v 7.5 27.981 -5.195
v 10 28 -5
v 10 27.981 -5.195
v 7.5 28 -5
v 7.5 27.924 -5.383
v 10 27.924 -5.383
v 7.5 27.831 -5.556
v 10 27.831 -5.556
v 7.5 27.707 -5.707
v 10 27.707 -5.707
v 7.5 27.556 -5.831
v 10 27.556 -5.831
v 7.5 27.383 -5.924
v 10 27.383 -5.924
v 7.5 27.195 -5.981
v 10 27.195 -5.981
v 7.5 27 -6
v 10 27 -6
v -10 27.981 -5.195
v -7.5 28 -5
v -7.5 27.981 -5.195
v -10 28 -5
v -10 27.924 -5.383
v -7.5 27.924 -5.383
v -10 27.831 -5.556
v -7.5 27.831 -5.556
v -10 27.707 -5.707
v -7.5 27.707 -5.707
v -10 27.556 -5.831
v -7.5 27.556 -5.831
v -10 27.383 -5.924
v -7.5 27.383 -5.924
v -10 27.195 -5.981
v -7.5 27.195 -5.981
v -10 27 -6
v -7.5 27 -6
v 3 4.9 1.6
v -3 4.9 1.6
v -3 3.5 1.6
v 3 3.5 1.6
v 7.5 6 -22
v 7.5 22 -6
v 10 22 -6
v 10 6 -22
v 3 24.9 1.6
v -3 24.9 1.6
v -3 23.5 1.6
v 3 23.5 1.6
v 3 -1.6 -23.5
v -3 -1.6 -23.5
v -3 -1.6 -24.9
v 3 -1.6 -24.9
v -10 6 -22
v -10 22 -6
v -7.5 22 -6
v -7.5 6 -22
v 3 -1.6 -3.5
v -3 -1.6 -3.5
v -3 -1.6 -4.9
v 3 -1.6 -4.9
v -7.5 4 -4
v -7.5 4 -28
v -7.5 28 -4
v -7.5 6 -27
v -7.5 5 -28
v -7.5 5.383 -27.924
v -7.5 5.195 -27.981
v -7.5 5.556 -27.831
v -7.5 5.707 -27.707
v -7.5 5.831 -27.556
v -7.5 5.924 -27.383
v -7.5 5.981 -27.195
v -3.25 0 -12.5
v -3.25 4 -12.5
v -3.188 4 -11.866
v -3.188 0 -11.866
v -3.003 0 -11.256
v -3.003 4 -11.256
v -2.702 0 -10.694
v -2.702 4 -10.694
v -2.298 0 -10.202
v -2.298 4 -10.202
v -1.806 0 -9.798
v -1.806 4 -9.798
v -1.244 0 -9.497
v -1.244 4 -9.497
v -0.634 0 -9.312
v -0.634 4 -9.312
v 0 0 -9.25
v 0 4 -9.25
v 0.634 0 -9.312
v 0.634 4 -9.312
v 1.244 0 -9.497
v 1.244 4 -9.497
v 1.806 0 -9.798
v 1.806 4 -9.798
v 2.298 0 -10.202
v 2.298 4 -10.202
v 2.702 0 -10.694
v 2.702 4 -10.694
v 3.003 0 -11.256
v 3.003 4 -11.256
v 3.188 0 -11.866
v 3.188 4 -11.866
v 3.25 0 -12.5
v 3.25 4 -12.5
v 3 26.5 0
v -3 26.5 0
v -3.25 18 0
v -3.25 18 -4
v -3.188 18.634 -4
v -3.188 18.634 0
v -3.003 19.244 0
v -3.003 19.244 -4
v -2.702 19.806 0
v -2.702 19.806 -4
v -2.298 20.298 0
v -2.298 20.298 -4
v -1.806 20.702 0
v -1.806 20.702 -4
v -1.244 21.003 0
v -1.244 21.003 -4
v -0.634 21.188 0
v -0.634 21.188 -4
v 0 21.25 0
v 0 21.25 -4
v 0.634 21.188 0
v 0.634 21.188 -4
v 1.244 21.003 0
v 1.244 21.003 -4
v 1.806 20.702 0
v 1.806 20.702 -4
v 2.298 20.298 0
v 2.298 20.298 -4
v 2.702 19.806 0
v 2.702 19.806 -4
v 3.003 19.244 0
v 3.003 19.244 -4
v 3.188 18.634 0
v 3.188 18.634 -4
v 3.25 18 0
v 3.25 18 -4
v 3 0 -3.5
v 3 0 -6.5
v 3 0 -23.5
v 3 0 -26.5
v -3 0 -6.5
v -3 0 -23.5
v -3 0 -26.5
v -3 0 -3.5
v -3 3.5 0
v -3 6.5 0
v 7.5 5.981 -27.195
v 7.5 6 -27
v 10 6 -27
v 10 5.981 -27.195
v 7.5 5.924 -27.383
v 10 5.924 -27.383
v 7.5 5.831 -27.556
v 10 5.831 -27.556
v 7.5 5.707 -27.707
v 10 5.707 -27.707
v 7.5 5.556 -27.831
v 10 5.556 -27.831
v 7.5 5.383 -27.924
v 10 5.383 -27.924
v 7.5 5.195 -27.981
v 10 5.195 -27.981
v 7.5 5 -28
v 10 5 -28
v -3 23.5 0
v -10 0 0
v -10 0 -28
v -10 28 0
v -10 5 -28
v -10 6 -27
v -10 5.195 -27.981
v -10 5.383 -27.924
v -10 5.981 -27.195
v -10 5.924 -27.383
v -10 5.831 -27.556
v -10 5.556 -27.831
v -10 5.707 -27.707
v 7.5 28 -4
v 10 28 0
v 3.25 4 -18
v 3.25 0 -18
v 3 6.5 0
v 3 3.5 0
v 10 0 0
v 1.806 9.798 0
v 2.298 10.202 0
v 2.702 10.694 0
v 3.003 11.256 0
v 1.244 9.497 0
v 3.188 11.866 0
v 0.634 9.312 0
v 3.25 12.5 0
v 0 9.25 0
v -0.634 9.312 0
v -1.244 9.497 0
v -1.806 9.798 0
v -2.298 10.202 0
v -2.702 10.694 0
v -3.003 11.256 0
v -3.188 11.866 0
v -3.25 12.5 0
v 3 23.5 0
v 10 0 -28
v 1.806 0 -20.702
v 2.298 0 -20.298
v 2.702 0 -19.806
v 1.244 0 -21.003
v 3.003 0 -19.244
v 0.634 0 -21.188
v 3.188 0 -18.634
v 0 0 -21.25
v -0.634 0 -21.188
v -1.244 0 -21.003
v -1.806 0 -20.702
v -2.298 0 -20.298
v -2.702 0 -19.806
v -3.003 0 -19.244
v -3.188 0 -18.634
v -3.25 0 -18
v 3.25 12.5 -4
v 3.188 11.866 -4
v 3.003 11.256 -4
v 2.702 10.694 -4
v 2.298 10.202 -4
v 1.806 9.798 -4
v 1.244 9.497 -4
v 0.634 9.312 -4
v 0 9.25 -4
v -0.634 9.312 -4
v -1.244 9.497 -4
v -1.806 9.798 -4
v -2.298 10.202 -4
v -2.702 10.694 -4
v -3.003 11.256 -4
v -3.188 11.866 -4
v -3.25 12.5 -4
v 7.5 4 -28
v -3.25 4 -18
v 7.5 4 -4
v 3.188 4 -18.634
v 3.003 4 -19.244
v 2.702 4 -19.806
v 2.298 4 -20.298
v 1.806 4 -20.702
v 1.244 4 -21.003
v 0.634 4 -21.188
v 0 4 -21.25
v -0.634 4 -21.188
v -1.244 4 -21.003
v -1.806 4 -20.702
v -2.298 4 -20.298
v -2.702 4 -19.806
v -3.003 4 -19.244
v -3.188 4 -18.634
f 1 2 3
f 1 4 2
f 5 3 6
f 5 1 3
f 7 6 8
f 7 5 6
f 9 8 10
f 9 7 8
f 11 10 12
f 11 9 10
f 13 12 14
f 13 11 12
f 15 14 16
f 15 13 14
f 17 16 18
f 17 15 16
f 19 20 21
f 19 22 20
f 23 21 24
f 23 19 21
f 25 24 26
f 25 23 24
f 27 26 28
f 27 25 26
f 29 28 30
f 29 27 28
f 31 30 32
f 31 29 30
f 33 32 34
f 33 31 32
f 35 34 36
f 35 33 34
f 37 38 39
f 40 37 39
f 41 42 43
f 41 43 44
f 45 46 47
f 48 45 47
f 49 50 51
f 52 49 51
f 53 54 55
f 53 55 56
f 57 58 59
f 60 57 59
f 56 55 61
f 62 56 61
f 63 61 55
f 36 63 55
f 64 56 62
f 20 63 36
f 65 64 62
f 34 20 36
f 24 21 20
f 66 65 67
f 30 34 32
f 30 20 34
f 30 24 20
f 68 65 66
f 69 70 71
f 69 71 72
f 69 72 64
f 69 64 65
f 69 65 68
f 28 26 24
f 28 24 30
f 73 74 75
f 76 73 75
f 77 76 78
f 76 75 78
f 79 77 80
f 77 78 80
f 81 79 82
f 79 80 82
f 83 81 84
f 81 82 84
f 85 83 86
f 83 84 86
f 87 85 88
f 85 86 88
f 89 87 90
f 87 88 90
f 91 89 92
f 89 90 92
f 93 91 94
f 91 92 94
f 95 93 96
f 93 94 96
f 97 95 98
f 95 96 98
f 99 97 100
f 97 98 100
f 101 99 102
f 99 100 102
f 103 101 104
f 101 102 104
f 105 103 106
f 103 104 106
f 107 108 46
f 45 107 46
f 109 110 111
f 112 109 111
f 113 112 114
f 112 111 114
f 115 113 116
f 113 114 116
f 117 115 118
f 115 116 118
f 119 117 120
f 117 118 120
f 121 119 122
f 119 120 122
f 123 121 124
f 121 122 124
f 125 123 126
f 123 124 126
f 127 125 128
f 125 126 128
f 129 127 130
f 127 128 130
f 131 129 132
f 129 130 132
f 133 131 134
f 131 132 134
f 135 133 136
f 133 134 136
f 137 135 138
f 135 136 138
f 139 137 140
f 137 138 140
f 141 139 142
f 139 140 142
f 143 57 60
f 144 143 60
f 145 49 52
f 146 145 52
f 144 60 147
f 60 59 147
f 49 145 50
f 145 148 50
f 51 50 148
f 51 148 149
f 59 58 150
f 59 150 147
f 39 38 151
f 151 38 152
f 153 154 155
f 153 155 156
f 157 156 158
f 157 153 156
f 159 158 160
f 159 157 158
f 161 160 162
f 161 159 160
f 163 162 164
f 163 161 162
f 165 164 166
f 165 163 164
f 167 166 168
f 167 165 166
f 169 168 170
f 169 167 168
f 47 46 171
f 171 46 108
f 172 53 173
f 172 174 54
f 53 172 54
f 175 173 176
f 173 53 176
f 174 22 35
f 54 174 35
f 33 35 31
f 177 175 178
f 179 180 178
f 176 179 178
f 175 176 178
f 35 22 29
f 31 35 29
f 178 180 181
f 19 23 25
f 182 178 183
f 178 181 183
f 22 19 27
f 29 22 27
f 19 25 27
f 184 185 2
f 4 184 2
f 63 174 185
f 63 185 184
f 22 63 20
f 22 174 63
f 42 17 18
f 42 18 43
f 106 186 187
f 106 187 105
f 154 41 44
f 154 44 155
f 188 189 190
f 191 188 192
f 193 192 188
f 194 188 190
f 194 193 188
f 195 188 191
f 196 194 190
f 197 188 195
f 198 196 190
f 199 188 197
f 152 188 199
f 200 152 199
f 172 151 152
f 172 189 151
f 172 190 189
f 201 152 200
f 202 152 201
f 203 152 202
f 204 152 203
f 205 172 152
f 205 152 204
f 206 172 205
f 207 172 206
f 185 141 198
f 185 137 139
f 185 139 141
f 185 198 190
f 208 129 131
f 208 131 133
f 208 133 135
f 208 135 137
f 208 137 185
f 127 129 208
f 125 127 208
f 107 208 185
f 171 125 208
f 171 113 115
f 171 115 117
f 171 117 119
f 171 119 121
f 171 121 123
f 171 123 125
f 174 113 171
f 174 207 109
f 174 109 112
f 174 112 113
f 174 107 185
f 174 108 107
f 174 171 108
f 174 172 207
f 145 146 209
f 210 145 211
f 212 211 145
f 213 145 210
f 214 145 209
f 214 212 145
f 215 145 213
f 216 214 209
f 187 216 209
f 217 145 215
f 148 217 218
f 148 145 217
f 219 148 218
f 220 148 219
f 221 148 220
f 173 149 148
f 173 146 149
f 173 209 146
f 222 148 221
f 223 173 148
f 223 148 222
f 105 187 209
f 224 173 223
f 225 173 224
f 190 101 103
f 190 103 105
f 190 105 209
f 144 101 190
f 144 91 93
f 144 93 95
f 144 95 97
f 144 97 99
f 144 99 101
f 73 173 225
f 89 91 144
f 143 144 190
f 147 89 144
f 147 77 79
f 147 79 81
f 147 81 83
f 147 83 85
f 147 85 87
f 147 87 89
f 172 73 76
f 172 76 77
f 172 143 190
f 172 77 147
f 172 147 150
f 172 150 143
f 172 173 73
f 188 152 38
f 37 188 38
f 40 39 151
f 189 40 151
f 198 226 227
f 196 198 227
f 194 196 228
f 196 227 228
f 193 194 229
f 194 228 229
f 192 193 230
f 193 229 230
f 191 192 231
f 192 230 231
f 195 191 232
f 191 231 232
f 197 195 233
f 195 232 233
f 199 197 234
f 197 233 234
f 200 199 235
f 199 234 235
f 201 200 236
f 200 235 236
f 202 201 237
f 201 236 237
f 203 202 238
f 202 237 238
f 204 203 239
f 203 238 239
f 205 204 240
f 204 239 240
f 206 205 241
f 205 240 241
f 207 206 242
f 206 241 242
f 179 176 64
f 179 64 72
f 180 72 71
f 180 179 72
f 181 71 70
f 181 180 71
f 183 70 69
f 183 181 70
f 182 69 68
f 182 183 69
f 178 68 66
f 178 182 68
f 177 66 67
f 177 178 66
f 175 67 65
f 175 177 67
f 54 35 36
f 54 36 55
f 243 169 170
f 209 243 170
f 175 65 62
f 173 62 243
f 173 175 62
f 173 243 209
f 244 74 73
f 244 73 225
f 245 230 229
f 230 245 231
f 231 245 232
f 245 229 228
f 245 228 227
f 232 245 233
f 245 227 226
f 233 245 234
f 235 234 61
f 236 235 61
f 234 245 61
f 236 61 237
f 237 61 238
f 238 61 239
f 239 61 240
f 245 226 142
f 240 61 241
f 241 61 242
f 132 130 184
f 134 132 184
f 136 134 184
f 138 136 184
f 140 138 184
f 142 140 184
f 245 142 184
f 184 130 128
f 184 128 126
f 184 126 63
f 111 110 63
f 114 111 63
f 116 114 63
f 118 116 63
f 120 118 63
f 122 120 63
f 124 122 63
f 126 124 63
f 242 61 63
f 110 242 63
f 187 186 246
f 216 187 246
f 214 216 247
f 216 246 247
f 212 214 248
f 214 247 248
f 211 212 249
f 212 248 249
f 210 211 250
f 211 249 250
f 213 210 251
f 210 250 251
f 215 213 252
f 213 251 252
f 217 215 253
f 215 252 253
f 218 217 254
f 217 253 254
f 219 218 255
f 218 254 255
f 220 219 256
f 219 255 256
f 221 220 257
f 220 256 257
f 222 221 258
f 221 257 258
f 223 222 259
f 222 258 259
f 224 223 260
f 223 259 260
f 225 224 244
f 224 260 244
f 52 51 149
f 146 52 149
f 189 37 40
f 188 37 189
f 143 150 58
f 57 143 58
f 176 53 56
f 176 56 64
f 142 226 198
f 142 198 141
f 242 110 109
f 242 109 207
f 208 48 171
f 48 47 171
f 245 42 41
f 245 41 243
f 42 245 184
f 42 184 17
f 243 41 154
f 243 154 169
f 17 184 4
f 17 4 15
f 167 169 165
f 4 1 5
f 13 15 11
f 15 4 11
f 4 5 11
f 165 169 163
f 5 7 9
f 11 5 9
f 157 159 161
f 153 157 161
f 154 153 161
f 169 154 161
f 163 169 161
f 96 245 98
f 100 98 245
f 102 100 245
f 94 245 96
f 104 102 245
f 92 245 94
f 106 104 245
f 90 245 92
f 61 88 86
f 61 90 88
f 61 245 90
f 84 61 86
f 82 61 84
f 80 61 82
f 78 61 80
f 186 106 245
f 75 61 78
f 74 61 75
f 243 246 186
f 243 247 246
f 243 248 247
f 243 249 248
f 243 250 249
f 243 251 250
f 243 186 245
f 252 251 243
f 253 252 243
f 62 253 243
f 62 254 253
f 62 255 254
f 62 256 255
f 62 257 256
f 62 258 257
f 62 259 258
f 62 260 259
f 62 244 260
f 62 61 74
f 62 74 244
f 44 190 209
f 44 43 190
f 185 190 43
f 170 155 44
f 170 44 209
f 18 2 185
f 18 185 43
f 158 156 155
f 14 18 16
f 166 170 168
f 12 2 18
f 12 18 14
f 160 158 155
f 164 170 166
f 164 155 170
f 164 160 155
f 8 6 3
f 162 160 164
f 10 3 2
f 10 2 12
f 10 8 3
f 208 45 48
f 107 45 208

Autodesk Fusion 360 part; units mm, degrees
sketch "Sketch1" plane through (0, 0, 0) normal (1, 0, 0) x (0, 0, -1)
  line L0 (0, 0) -> (0, 28)
  line L1 (0, 28) -> (5, 28)
  line L2 (6, 27) -> (6, 22)
  line L3 (6, 22) -> (22, 6)
  line L4 (22, 6) -> (27, 6)
  line L5 (28, 5) -> (28, 0)
  line L6 (28, 0) -> (0, 0)
  line L7 (4, 4) -> (28, 4)
  line L8 (4, 4) -> (4, 28)
  arc A0 (6, 27) -> (5, 28) centre (5, 27) ccw
  arc A1 (28, 5) -> (27, 6) centre (27, 5) ccw
  line L9 (0, 26.5) -> (-1.6, 24.9)
  line L10 (-1.6, 24.9) -> (-1.6, 23.5)
  line L11 (-1.6, 23.5) -> (0, 23.5)
  line L12 (0, 6.5) -> (-1.6, 4.9)
  line L13 (-1.6, 4.9) -> (-1.6, 3.5)
  line L14 (-1.6, 3.5) -> (0, 3.5)
  line L15 (3.5, 0) -> (3.5, -1.6)
  line L16 (3.5, -1.6) -> (4.9, -1.6)
  line L17 (4.9, -1.6) -> (6.5, 0)
  line L18 (23.5, 0) -> (23.5, -1.6)
  line L19 (23.5, -1.6) -> (24.9, -1.6)
  line L20 (24.9, -1.6) -> (26.5, 0)
  line L21 (-56.6063, 27.9695) -> (-36.6063, 27.9695)
  line L22 (-36.6063, 27.9695) -> (-36.6063, -0.0305)
  line L23 (-36.6063, -0.0305) -> (-56.6063, -0.0305)
  line L24 (-56.6063, -0.0305) -> (-56.6063, 27.9695)
  line L25 (-54.1063, 3.9695) -> (-39.1063, 3.9695)
  line L26 (-39.1063, 3.9695) -> (-39.1063, 27.9695)
  line L27 (-39.1063, 27.9695) -> (-54.1063, 27.9695)
  line L28 (-54.1063, 27.9695) -> (-54.1063, 3.9695)
  line L29 (-49.7743, 13.4695) -> (-49.7743, 16.9695)
  arc A2 (-43.2743, 16.9695) -> (-49.7743, 16.9695) centre (-46.5243, 16.9695) ccw
  line L30 (-43.2743, 16.9695) -> (-43.2743, 13.4695)
  arc A3 (-49.7743, 13.4695) -> (-43.2743, 13.4695) centre (-46.5243, 13.4695) ccw
  line L31 (-49.5243, -1.6305) -> (-43.5243, -1.6305)
  line L32 (-43.5243, -1.6305) -> (-43.5243, -0.0305)
  line L33 (-43.5243, -0.0305) -> (-49.5243, -0.0305)
  line L34 (-49.5243, -0.0305) -> (-49.5243, -1.6305)
  point P0 (6, 28)
  point P1 (28, 6)
  dimension "d1" = 28
  dimension "d2" = 28
  dimension "d3" = 6
  dimension "d4" = 6
  dimension "d5" = 45
  dimension "d6" = 22
  dimension "d7" = 4
  dimension "d8" = 4
  dimension "d9" = 1
  dimension "d11" = 45
  dimension "d12" = 1.6
  dimension "d14" = 3
  dimension "d16" = 3
  dimension "d17" = 20
  dimension "d18" = 20
  dimension "d19" = 3
  dimension "d20" = 3
  dimension "d21" = 45
  dimension "d22" = 3.5
  dimension "d23" = 1.6
  dimension "d26" = 20
  dimension "d27" = 2.5
  dimension "d28" = 15
  dimension "d29" = 6.5
  dimension "d30" = 3.5
  dimension "d31" = 13.5
  dimension "d32" = 4
  dimension "d33" = 28
  dimension "d34" = 6
  dimension "d35" = 0.25
  dimension "d36" = 1.6
  dimension "d41" = 3.5
extrude "Extrude1" add sketch "Sketch1" along normal mid plane 20 contours L0 L1 L5 L6 L7 L8 | L1 L2 L3 L4 L5 L7 L8 A0 A1
extrude "Extrude2" cut sketch "Sketch1" along normal mid plane 15 contours L1 L2 L3 L4 L5 L7 L8 A0 A1
extrude "Extrude3" add sketch "Sketch1" along normal mid plane 6 contours L0 L12 L13 L14 | L6 L15 L16 L17 | L0 L9 L10 L11 | L6 L18 L19 L20
sketch "Sketch2" plane through (0, 0, -4) normal (0, 0, -1) x (-1, 0, 0)
  line L0 (-7.5, 4) -> (7.5, 4)
  line L1 (7.5, 4) -> (7.5, 28)
  line L2 (7.5, 28) -> (-7.5, 28)
  line L3 (-7.5, 28) -> (-7.5, 4)
  line L4 (-3.25, 12.5) -> (-3.25, 18)
  arc A0 (3.25, 18) -> (-3.25, 18) centre (0, 18) ccw
  line L5 (3.25, 18) -> (3.25, 12.5)
  arc A1 (-3.25, 12.5) -> (3.25, 12.5) centre (0, 12.5) ccw
  line L6 (-10, 0) -> (10, 0)
  point P0 (0, 28)
  dimension "d42" = 6.5
  dimension "d43" = 5.5
  dimension "d44" = 12.5
extrude "Extrude4" cut sketch "Sketch2" against normal through all contours L4 A0 L5 A1
sketch "Sketch3" plane through (0, 4, 0) normal (0, 1, 0) x (-1, 0, 0)
  line L0 (-7.5, -28) -> (7.5, -28)
  line L1 (7.5, -28) -> (7.5, -4)
  line L2 (7.5, -4) -> (-7.5, -4)
  line L3 (-7.5, -4) -> (-7.5, -28)
  line L4 (3.25, -12.5) -> (3.25, -18)
  arc A0 (-3.25, -18) -> (3.25, -18) centre (0, -18) ccw
  line L5 (-3.25, -18) -> (-3.25, -12.5)
  arc A1 (3.25, -12.5) -> (-3.25, -12.5) centre (0, -12.5) ccw
  line L6 (10, 0) -> (-10, 0)
  point P0 (0, -28)
  dimension "d46" = 6.5
  dimension "d47" = 12.5
  dimension "d48" = 5.5
extrude "Extrude5" cut sketch "Sketch3" against normal through all contours L4 A0 L5 A1
equation "d16 = d14"
equation "d18 = d17"
equation "d19 = d14"
equation "d20 = d14"
equation "d21 = d11"
equation "d22 = d41"
equation "d23 = d12"
